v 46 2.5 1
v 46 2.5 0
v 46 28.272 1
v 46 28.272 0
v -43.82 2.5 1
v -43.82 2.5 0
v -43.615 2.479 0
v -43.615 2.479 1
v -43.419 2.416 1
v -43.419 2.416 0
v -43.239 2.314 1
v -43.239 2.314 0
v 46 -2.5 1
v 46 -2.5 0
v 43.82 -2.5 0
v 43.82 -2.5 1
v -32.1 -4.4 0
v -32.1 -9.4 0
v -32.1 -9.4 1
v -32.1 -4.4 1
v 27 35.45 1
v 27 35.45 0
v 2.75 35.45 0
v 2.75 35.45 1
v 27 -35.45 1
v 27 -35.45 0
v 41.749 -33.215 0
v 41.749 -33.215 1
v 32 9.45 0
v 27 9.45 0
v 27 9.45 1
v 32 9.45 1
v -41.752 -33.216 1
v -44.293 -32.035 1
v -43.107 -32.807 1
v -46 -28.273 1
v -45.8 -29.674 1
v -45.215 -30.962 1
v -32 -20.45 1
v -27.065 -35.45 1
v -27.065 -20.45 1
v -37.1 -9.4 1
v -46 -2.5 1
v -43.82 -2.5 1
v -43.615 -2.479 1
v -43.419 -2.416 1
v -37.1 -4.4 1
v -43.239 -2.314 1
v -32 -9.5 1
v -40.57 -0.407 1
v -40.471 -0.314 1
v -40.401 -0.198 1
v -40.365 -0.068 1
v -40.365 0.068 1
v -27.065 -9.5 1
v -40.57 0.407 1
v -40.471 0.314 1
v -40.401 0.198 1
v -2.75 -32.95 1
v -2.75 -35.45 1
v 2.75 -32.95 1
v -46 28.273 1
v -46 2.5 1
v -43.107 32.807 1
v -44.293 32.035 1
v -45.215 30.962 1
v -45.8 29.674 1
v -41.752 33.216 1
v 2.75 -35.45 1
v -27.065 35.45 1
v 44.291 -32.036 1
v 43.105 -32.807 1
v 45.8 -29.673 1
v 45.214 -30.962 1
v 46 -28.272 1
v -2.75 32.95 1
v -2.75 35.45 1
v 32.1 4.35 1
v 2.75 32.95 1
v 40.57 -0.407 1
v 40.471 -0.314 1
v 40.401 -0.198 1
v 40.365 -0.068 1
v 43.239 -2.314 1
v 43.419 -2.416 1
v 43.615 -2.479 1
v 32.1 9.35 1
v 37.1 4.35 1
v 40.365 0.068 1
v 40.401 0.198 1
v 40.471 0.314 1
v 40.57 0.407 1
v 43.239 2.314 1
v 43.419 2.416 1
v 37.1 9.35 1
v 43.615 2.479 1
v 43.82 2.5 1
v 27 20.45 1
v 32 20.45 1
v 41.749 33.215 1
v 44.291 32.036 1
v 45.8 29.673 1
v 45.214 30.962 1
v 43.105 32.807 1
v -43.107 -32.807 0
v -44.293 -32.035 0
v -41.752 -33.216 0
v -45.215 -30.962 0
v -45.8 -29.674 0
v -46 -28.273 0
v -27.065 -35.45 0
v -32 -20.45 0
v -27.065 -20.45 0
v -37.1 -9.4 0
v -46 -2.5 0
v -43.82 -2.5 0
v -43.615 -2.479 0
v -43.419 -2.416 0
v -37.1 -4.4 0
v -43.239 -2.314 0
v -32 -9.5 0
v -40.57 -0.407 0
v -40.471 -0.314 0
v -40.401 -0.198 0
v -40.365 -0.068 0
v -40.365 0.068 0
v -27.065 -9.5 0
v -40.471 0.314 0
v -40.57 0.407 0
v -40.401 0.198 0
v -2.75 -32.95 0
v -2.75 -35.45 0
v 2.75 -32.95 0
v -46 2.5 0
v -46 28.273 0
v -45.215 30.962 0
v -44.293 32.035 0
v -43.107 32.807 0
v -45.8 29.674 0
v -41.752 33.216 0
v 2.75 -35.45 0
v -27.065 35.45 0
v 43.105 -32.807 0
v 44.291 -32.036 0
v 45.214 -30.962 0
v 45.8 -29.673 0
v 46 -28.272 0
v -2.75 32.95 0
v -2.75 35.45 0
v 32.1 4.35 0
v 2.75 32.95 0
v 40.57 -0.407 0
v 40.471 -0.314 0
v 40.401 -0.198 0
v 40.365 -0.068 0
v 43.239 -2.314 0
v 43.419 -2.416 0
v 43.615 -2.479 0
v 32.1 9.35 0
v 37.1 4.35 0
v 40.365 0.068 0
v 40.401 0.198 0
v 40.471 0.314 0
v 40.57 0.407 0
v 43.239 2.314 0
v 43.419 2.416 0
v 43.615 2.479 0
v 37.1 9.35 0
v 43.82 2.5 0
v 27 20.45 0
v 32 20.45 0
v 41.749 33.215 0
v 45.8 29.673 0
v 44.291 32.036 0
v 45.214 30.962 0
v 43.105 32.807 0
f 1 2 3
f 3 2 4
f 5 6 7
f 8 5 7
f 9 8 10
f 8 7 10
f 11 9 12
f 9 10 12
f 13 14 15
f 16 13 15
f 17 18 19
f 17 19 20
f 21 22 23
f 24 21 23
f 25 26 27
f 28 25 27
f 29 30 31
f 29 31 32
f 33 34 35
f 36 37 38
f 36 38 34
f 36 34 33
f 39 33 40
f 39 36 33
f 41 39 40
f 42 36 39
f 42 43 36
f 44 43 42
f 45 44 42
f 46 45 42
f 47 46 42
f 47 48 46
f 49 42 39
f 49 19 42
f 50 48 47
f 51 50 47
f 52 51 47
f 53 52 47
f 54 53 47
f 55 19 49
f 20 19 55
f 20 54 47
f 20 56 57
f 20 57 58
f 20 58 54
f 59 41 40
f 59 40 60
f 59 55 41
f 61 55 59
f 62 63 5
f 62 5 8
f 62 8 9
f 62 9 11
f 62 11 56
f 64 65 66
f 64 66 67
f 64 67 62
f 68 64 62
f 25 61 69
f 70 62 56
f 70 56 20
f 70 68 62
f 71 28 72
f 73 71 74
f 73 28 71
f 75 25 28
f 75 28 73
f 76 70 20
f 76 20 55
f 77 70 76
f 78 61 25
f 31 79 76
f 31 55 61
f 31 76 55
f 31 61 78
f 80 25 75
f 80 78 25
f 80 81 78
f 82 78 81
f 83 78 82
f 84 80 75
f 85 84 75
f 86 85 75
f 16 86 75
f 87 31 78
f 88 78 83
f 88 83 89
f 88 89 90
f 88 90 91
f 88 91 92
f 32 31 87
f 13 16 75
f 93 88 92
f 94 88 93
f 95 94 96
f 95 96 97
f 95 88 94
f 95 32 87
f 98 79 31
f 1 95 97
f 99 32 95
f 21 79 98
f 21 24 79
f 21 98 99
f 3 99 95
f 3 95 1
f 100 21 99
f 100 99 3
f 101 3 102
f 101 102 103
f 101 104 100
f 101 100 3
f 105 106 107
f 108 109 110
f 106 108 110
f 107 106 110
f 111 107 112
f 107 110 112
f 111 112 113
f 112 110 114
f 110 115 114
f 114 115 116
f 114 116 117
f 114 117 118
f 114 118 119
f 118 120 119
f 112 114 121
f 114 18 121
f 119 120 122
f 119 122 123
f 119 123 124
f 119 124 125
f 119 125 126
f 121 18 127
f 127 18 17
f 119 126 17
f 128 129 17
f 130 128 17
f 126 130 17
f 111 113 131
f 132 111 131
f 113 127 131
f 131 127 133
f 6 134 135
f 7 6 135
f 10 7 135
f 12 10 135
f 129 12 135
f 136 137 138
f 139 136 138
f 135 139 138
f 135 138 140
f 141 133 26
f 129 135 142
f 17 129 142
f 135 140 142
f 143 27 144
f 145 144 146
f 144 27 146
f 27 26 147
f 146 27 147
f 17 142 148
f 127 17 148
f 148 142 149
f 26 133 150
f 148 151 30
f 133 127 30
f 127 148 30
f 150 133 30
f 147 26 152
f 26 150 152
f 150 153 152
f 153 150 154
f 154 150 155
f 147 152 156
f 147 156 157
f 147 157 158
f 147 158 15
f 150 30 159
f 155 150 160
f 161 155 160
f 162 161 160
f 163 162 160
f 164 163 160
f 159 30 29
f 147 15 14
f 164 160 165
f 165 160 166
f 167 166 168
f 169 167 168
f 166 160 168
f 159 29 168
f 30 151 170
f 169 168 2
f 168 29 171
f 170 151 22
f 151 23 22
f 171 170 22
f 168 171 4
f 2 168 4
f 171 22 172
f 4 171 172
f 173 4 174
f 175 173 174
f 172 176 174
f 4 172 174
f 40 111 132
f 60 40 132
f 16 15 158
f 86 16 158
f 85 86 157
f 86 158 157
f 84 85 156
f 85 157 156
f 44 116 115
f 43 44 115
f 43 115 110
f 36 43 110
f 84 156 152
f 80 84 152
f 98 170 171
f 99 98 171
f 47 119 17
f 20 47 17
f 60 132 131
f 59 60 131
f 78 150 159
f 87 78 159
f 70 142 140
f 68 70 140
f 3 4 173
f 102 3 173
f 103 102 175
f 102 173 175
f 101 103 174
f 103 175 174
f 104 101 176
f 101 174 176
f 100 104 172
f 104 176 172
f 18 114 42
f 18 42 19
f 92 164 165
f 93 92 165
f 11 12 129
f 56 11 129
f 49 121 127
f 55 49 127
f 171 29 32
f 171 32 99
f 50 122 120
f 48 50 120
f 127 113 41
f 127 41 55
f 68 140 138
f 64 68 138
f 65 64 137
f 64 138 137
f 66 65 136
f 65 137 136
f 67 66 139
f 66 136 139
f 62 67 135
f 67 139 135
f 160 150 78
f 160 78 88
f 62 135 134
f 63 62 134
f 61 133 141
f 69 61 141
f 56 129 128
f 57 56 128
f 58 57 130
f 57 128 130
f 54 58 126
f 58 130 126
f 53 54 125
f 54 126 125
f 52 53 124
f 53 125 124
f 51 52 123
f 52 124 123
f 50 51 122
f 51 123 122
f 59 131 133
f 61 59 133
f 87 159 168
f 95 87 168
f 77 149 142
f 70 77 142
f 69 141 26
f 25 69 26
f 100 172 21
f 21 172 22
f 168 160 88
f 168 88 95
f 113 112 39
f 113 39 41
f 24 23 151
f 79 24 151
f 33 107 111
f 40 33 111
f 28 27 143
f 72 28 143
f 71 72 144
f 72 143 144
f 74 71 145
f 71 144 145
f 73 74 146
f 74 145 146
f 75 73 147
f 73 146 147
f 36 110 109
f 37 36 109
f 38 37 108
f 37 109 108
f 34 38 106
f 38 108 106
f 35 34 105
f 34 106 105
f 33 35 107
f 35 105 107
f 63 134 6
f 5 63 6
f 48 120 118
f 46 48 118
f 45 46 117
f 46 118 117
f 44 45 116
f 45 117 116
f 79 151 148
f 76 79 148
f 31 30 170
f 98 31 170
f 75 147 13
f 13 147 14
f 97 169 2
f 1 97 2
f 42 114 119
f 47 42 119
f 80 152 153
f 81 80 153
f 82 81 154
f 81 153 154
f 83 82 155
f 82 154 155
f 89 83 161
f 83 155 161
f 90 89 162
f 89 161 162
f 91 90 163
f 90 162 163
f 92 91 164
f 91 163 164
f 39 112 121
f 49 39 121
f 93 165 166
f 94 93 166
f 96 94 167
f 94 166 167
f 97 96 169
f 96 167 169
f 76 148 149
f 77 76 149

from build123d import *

# Parameters (mm, degrees)
F0_W     = 4.935211
F0_H     = 10.95
F0_W_2   = 5
F0_H_2   = 5
F0_H_3   = 11
F1_DEPTH = 1


with BuildPart() as f1:
    # F0 (on Top) → F1 (new body)
    with BuildSketch(Plane.XY):
        with BuildLine():
            ThreePointArc((41.749027, -33.215299), (44.791117, -31.531696), (46, -28.271721))
            Line((46, -28.271721), (46, -2.5))
            Line((46, -2.5), (43.820465, -2.5))
            ThreePointArc((43.820465, -2.5), (43.515288, -2.452296), (43.239227, -2.313733))
            Line((43.239227, -2.313733), (40.569613, -0.406867))
            ThreePointArc((40.569613, -0.406867), (40.360233, 0), (40.569613, 0.406867))
            Line((40.569613, 0.406867), (43.239227, 2.313733))
            ThreePointArc((43.239227, 2.313733), (43.515288, 2.452296), (43.820465, 2.5))
            Line((43.820465, 2.5), (46, 2.5))
            Line((46, 2.5), (46, 28.271721))
            ThreePointArc((46, 28.271721), (44.791117, 31.531696), (41.749027, 33.215299))
            Line((41.749027, 33.215299), (27, 35.45))
            Line((27, 35.45), (2.75, 35.45))
            Line((2.75, 35.45), (2.75, 32.95))
            Line((2.75, 32.95), (0, 32.95))
            Line((0, 32.95), (-2.75, 32.95))
            Line((-2.75, 32.95), (-2.75, 35.45))
            Line((-2.75, 35.45), (-27.064789, 35.45))
            Line((-27.064789, 35.45), (-41.751913, 33.215906))
            ThreePointArc((-41.751913, 33.215906), (-44.792068, 31.531634), (-46, 28.272766))
            Line((-46, 28.272766), (-46, 2.5))
            Line((-46, 2.5), (-43.820465, 2.5))
            ThreePointArc((-43.820465, 2.5), (-43.515288, 2.452296), (-43.239227, 2.313733))
            Line((-43.239227, 2.313733), (-40.569613, 0.406867))
            ThreePointArc((-40.569613, 0.406867), (-40.360233, 0), (-40.569613, -0.406867))
            Line((-40.569613, -0.406867), (-43.239227, -2.313733))
            ThreePointArc((-43.239227, -2.313733), (-43.515288, -2.452296), (-43.820465, -2.5))
            Line((-43.820465, -2.5), (-46, -2.5))
            Line((-46, -2.5), (-46, -28.272766))
            ThreePointArc((-46, -28.272766), (-44.792068, -31.531634), (-41.751913, -33.215906))
            Line((-41.751913, -33.215906), (-27.064789, -35.45))
            Line((-27.064789, -35.45), (-2.75, -35.45))
            Line((-2.75, -35.45), (-2.75, -32.95))
            Line((-2.75, -32.95), (0, -32.95))
            Line((0, -32.95), (2.75, -32.95))
            Line((2.75, -32.95), (2.75, -35.45))
            Line((2.75, -35.45), (27, -35.45))
            Line((27, -35.45), (41.749027, -33.215299))
        make_face()
        with Locations((-29.532394, -14.975)):
            Rectangle(F0_W, F0_H, mode=Mode.SUBTRACT)
        with Locations((-34.6, -6.9)):
            Rectangle(F0_W_2, F0_H_2, mode=Mode.SUBTRACT)
        with Locations((34.6, 6.85)):
            Rectangle(F0_W_2, F0_H_2, mode=Mode.SUBTRACT)
        with Locations((29.5, 14.95)):
            Rectangle(F0_W_2, F0_H_3, mode=Mode.SUBTRACT)
    extrude(amount=F1_DEPTH)


solid = f1.part
